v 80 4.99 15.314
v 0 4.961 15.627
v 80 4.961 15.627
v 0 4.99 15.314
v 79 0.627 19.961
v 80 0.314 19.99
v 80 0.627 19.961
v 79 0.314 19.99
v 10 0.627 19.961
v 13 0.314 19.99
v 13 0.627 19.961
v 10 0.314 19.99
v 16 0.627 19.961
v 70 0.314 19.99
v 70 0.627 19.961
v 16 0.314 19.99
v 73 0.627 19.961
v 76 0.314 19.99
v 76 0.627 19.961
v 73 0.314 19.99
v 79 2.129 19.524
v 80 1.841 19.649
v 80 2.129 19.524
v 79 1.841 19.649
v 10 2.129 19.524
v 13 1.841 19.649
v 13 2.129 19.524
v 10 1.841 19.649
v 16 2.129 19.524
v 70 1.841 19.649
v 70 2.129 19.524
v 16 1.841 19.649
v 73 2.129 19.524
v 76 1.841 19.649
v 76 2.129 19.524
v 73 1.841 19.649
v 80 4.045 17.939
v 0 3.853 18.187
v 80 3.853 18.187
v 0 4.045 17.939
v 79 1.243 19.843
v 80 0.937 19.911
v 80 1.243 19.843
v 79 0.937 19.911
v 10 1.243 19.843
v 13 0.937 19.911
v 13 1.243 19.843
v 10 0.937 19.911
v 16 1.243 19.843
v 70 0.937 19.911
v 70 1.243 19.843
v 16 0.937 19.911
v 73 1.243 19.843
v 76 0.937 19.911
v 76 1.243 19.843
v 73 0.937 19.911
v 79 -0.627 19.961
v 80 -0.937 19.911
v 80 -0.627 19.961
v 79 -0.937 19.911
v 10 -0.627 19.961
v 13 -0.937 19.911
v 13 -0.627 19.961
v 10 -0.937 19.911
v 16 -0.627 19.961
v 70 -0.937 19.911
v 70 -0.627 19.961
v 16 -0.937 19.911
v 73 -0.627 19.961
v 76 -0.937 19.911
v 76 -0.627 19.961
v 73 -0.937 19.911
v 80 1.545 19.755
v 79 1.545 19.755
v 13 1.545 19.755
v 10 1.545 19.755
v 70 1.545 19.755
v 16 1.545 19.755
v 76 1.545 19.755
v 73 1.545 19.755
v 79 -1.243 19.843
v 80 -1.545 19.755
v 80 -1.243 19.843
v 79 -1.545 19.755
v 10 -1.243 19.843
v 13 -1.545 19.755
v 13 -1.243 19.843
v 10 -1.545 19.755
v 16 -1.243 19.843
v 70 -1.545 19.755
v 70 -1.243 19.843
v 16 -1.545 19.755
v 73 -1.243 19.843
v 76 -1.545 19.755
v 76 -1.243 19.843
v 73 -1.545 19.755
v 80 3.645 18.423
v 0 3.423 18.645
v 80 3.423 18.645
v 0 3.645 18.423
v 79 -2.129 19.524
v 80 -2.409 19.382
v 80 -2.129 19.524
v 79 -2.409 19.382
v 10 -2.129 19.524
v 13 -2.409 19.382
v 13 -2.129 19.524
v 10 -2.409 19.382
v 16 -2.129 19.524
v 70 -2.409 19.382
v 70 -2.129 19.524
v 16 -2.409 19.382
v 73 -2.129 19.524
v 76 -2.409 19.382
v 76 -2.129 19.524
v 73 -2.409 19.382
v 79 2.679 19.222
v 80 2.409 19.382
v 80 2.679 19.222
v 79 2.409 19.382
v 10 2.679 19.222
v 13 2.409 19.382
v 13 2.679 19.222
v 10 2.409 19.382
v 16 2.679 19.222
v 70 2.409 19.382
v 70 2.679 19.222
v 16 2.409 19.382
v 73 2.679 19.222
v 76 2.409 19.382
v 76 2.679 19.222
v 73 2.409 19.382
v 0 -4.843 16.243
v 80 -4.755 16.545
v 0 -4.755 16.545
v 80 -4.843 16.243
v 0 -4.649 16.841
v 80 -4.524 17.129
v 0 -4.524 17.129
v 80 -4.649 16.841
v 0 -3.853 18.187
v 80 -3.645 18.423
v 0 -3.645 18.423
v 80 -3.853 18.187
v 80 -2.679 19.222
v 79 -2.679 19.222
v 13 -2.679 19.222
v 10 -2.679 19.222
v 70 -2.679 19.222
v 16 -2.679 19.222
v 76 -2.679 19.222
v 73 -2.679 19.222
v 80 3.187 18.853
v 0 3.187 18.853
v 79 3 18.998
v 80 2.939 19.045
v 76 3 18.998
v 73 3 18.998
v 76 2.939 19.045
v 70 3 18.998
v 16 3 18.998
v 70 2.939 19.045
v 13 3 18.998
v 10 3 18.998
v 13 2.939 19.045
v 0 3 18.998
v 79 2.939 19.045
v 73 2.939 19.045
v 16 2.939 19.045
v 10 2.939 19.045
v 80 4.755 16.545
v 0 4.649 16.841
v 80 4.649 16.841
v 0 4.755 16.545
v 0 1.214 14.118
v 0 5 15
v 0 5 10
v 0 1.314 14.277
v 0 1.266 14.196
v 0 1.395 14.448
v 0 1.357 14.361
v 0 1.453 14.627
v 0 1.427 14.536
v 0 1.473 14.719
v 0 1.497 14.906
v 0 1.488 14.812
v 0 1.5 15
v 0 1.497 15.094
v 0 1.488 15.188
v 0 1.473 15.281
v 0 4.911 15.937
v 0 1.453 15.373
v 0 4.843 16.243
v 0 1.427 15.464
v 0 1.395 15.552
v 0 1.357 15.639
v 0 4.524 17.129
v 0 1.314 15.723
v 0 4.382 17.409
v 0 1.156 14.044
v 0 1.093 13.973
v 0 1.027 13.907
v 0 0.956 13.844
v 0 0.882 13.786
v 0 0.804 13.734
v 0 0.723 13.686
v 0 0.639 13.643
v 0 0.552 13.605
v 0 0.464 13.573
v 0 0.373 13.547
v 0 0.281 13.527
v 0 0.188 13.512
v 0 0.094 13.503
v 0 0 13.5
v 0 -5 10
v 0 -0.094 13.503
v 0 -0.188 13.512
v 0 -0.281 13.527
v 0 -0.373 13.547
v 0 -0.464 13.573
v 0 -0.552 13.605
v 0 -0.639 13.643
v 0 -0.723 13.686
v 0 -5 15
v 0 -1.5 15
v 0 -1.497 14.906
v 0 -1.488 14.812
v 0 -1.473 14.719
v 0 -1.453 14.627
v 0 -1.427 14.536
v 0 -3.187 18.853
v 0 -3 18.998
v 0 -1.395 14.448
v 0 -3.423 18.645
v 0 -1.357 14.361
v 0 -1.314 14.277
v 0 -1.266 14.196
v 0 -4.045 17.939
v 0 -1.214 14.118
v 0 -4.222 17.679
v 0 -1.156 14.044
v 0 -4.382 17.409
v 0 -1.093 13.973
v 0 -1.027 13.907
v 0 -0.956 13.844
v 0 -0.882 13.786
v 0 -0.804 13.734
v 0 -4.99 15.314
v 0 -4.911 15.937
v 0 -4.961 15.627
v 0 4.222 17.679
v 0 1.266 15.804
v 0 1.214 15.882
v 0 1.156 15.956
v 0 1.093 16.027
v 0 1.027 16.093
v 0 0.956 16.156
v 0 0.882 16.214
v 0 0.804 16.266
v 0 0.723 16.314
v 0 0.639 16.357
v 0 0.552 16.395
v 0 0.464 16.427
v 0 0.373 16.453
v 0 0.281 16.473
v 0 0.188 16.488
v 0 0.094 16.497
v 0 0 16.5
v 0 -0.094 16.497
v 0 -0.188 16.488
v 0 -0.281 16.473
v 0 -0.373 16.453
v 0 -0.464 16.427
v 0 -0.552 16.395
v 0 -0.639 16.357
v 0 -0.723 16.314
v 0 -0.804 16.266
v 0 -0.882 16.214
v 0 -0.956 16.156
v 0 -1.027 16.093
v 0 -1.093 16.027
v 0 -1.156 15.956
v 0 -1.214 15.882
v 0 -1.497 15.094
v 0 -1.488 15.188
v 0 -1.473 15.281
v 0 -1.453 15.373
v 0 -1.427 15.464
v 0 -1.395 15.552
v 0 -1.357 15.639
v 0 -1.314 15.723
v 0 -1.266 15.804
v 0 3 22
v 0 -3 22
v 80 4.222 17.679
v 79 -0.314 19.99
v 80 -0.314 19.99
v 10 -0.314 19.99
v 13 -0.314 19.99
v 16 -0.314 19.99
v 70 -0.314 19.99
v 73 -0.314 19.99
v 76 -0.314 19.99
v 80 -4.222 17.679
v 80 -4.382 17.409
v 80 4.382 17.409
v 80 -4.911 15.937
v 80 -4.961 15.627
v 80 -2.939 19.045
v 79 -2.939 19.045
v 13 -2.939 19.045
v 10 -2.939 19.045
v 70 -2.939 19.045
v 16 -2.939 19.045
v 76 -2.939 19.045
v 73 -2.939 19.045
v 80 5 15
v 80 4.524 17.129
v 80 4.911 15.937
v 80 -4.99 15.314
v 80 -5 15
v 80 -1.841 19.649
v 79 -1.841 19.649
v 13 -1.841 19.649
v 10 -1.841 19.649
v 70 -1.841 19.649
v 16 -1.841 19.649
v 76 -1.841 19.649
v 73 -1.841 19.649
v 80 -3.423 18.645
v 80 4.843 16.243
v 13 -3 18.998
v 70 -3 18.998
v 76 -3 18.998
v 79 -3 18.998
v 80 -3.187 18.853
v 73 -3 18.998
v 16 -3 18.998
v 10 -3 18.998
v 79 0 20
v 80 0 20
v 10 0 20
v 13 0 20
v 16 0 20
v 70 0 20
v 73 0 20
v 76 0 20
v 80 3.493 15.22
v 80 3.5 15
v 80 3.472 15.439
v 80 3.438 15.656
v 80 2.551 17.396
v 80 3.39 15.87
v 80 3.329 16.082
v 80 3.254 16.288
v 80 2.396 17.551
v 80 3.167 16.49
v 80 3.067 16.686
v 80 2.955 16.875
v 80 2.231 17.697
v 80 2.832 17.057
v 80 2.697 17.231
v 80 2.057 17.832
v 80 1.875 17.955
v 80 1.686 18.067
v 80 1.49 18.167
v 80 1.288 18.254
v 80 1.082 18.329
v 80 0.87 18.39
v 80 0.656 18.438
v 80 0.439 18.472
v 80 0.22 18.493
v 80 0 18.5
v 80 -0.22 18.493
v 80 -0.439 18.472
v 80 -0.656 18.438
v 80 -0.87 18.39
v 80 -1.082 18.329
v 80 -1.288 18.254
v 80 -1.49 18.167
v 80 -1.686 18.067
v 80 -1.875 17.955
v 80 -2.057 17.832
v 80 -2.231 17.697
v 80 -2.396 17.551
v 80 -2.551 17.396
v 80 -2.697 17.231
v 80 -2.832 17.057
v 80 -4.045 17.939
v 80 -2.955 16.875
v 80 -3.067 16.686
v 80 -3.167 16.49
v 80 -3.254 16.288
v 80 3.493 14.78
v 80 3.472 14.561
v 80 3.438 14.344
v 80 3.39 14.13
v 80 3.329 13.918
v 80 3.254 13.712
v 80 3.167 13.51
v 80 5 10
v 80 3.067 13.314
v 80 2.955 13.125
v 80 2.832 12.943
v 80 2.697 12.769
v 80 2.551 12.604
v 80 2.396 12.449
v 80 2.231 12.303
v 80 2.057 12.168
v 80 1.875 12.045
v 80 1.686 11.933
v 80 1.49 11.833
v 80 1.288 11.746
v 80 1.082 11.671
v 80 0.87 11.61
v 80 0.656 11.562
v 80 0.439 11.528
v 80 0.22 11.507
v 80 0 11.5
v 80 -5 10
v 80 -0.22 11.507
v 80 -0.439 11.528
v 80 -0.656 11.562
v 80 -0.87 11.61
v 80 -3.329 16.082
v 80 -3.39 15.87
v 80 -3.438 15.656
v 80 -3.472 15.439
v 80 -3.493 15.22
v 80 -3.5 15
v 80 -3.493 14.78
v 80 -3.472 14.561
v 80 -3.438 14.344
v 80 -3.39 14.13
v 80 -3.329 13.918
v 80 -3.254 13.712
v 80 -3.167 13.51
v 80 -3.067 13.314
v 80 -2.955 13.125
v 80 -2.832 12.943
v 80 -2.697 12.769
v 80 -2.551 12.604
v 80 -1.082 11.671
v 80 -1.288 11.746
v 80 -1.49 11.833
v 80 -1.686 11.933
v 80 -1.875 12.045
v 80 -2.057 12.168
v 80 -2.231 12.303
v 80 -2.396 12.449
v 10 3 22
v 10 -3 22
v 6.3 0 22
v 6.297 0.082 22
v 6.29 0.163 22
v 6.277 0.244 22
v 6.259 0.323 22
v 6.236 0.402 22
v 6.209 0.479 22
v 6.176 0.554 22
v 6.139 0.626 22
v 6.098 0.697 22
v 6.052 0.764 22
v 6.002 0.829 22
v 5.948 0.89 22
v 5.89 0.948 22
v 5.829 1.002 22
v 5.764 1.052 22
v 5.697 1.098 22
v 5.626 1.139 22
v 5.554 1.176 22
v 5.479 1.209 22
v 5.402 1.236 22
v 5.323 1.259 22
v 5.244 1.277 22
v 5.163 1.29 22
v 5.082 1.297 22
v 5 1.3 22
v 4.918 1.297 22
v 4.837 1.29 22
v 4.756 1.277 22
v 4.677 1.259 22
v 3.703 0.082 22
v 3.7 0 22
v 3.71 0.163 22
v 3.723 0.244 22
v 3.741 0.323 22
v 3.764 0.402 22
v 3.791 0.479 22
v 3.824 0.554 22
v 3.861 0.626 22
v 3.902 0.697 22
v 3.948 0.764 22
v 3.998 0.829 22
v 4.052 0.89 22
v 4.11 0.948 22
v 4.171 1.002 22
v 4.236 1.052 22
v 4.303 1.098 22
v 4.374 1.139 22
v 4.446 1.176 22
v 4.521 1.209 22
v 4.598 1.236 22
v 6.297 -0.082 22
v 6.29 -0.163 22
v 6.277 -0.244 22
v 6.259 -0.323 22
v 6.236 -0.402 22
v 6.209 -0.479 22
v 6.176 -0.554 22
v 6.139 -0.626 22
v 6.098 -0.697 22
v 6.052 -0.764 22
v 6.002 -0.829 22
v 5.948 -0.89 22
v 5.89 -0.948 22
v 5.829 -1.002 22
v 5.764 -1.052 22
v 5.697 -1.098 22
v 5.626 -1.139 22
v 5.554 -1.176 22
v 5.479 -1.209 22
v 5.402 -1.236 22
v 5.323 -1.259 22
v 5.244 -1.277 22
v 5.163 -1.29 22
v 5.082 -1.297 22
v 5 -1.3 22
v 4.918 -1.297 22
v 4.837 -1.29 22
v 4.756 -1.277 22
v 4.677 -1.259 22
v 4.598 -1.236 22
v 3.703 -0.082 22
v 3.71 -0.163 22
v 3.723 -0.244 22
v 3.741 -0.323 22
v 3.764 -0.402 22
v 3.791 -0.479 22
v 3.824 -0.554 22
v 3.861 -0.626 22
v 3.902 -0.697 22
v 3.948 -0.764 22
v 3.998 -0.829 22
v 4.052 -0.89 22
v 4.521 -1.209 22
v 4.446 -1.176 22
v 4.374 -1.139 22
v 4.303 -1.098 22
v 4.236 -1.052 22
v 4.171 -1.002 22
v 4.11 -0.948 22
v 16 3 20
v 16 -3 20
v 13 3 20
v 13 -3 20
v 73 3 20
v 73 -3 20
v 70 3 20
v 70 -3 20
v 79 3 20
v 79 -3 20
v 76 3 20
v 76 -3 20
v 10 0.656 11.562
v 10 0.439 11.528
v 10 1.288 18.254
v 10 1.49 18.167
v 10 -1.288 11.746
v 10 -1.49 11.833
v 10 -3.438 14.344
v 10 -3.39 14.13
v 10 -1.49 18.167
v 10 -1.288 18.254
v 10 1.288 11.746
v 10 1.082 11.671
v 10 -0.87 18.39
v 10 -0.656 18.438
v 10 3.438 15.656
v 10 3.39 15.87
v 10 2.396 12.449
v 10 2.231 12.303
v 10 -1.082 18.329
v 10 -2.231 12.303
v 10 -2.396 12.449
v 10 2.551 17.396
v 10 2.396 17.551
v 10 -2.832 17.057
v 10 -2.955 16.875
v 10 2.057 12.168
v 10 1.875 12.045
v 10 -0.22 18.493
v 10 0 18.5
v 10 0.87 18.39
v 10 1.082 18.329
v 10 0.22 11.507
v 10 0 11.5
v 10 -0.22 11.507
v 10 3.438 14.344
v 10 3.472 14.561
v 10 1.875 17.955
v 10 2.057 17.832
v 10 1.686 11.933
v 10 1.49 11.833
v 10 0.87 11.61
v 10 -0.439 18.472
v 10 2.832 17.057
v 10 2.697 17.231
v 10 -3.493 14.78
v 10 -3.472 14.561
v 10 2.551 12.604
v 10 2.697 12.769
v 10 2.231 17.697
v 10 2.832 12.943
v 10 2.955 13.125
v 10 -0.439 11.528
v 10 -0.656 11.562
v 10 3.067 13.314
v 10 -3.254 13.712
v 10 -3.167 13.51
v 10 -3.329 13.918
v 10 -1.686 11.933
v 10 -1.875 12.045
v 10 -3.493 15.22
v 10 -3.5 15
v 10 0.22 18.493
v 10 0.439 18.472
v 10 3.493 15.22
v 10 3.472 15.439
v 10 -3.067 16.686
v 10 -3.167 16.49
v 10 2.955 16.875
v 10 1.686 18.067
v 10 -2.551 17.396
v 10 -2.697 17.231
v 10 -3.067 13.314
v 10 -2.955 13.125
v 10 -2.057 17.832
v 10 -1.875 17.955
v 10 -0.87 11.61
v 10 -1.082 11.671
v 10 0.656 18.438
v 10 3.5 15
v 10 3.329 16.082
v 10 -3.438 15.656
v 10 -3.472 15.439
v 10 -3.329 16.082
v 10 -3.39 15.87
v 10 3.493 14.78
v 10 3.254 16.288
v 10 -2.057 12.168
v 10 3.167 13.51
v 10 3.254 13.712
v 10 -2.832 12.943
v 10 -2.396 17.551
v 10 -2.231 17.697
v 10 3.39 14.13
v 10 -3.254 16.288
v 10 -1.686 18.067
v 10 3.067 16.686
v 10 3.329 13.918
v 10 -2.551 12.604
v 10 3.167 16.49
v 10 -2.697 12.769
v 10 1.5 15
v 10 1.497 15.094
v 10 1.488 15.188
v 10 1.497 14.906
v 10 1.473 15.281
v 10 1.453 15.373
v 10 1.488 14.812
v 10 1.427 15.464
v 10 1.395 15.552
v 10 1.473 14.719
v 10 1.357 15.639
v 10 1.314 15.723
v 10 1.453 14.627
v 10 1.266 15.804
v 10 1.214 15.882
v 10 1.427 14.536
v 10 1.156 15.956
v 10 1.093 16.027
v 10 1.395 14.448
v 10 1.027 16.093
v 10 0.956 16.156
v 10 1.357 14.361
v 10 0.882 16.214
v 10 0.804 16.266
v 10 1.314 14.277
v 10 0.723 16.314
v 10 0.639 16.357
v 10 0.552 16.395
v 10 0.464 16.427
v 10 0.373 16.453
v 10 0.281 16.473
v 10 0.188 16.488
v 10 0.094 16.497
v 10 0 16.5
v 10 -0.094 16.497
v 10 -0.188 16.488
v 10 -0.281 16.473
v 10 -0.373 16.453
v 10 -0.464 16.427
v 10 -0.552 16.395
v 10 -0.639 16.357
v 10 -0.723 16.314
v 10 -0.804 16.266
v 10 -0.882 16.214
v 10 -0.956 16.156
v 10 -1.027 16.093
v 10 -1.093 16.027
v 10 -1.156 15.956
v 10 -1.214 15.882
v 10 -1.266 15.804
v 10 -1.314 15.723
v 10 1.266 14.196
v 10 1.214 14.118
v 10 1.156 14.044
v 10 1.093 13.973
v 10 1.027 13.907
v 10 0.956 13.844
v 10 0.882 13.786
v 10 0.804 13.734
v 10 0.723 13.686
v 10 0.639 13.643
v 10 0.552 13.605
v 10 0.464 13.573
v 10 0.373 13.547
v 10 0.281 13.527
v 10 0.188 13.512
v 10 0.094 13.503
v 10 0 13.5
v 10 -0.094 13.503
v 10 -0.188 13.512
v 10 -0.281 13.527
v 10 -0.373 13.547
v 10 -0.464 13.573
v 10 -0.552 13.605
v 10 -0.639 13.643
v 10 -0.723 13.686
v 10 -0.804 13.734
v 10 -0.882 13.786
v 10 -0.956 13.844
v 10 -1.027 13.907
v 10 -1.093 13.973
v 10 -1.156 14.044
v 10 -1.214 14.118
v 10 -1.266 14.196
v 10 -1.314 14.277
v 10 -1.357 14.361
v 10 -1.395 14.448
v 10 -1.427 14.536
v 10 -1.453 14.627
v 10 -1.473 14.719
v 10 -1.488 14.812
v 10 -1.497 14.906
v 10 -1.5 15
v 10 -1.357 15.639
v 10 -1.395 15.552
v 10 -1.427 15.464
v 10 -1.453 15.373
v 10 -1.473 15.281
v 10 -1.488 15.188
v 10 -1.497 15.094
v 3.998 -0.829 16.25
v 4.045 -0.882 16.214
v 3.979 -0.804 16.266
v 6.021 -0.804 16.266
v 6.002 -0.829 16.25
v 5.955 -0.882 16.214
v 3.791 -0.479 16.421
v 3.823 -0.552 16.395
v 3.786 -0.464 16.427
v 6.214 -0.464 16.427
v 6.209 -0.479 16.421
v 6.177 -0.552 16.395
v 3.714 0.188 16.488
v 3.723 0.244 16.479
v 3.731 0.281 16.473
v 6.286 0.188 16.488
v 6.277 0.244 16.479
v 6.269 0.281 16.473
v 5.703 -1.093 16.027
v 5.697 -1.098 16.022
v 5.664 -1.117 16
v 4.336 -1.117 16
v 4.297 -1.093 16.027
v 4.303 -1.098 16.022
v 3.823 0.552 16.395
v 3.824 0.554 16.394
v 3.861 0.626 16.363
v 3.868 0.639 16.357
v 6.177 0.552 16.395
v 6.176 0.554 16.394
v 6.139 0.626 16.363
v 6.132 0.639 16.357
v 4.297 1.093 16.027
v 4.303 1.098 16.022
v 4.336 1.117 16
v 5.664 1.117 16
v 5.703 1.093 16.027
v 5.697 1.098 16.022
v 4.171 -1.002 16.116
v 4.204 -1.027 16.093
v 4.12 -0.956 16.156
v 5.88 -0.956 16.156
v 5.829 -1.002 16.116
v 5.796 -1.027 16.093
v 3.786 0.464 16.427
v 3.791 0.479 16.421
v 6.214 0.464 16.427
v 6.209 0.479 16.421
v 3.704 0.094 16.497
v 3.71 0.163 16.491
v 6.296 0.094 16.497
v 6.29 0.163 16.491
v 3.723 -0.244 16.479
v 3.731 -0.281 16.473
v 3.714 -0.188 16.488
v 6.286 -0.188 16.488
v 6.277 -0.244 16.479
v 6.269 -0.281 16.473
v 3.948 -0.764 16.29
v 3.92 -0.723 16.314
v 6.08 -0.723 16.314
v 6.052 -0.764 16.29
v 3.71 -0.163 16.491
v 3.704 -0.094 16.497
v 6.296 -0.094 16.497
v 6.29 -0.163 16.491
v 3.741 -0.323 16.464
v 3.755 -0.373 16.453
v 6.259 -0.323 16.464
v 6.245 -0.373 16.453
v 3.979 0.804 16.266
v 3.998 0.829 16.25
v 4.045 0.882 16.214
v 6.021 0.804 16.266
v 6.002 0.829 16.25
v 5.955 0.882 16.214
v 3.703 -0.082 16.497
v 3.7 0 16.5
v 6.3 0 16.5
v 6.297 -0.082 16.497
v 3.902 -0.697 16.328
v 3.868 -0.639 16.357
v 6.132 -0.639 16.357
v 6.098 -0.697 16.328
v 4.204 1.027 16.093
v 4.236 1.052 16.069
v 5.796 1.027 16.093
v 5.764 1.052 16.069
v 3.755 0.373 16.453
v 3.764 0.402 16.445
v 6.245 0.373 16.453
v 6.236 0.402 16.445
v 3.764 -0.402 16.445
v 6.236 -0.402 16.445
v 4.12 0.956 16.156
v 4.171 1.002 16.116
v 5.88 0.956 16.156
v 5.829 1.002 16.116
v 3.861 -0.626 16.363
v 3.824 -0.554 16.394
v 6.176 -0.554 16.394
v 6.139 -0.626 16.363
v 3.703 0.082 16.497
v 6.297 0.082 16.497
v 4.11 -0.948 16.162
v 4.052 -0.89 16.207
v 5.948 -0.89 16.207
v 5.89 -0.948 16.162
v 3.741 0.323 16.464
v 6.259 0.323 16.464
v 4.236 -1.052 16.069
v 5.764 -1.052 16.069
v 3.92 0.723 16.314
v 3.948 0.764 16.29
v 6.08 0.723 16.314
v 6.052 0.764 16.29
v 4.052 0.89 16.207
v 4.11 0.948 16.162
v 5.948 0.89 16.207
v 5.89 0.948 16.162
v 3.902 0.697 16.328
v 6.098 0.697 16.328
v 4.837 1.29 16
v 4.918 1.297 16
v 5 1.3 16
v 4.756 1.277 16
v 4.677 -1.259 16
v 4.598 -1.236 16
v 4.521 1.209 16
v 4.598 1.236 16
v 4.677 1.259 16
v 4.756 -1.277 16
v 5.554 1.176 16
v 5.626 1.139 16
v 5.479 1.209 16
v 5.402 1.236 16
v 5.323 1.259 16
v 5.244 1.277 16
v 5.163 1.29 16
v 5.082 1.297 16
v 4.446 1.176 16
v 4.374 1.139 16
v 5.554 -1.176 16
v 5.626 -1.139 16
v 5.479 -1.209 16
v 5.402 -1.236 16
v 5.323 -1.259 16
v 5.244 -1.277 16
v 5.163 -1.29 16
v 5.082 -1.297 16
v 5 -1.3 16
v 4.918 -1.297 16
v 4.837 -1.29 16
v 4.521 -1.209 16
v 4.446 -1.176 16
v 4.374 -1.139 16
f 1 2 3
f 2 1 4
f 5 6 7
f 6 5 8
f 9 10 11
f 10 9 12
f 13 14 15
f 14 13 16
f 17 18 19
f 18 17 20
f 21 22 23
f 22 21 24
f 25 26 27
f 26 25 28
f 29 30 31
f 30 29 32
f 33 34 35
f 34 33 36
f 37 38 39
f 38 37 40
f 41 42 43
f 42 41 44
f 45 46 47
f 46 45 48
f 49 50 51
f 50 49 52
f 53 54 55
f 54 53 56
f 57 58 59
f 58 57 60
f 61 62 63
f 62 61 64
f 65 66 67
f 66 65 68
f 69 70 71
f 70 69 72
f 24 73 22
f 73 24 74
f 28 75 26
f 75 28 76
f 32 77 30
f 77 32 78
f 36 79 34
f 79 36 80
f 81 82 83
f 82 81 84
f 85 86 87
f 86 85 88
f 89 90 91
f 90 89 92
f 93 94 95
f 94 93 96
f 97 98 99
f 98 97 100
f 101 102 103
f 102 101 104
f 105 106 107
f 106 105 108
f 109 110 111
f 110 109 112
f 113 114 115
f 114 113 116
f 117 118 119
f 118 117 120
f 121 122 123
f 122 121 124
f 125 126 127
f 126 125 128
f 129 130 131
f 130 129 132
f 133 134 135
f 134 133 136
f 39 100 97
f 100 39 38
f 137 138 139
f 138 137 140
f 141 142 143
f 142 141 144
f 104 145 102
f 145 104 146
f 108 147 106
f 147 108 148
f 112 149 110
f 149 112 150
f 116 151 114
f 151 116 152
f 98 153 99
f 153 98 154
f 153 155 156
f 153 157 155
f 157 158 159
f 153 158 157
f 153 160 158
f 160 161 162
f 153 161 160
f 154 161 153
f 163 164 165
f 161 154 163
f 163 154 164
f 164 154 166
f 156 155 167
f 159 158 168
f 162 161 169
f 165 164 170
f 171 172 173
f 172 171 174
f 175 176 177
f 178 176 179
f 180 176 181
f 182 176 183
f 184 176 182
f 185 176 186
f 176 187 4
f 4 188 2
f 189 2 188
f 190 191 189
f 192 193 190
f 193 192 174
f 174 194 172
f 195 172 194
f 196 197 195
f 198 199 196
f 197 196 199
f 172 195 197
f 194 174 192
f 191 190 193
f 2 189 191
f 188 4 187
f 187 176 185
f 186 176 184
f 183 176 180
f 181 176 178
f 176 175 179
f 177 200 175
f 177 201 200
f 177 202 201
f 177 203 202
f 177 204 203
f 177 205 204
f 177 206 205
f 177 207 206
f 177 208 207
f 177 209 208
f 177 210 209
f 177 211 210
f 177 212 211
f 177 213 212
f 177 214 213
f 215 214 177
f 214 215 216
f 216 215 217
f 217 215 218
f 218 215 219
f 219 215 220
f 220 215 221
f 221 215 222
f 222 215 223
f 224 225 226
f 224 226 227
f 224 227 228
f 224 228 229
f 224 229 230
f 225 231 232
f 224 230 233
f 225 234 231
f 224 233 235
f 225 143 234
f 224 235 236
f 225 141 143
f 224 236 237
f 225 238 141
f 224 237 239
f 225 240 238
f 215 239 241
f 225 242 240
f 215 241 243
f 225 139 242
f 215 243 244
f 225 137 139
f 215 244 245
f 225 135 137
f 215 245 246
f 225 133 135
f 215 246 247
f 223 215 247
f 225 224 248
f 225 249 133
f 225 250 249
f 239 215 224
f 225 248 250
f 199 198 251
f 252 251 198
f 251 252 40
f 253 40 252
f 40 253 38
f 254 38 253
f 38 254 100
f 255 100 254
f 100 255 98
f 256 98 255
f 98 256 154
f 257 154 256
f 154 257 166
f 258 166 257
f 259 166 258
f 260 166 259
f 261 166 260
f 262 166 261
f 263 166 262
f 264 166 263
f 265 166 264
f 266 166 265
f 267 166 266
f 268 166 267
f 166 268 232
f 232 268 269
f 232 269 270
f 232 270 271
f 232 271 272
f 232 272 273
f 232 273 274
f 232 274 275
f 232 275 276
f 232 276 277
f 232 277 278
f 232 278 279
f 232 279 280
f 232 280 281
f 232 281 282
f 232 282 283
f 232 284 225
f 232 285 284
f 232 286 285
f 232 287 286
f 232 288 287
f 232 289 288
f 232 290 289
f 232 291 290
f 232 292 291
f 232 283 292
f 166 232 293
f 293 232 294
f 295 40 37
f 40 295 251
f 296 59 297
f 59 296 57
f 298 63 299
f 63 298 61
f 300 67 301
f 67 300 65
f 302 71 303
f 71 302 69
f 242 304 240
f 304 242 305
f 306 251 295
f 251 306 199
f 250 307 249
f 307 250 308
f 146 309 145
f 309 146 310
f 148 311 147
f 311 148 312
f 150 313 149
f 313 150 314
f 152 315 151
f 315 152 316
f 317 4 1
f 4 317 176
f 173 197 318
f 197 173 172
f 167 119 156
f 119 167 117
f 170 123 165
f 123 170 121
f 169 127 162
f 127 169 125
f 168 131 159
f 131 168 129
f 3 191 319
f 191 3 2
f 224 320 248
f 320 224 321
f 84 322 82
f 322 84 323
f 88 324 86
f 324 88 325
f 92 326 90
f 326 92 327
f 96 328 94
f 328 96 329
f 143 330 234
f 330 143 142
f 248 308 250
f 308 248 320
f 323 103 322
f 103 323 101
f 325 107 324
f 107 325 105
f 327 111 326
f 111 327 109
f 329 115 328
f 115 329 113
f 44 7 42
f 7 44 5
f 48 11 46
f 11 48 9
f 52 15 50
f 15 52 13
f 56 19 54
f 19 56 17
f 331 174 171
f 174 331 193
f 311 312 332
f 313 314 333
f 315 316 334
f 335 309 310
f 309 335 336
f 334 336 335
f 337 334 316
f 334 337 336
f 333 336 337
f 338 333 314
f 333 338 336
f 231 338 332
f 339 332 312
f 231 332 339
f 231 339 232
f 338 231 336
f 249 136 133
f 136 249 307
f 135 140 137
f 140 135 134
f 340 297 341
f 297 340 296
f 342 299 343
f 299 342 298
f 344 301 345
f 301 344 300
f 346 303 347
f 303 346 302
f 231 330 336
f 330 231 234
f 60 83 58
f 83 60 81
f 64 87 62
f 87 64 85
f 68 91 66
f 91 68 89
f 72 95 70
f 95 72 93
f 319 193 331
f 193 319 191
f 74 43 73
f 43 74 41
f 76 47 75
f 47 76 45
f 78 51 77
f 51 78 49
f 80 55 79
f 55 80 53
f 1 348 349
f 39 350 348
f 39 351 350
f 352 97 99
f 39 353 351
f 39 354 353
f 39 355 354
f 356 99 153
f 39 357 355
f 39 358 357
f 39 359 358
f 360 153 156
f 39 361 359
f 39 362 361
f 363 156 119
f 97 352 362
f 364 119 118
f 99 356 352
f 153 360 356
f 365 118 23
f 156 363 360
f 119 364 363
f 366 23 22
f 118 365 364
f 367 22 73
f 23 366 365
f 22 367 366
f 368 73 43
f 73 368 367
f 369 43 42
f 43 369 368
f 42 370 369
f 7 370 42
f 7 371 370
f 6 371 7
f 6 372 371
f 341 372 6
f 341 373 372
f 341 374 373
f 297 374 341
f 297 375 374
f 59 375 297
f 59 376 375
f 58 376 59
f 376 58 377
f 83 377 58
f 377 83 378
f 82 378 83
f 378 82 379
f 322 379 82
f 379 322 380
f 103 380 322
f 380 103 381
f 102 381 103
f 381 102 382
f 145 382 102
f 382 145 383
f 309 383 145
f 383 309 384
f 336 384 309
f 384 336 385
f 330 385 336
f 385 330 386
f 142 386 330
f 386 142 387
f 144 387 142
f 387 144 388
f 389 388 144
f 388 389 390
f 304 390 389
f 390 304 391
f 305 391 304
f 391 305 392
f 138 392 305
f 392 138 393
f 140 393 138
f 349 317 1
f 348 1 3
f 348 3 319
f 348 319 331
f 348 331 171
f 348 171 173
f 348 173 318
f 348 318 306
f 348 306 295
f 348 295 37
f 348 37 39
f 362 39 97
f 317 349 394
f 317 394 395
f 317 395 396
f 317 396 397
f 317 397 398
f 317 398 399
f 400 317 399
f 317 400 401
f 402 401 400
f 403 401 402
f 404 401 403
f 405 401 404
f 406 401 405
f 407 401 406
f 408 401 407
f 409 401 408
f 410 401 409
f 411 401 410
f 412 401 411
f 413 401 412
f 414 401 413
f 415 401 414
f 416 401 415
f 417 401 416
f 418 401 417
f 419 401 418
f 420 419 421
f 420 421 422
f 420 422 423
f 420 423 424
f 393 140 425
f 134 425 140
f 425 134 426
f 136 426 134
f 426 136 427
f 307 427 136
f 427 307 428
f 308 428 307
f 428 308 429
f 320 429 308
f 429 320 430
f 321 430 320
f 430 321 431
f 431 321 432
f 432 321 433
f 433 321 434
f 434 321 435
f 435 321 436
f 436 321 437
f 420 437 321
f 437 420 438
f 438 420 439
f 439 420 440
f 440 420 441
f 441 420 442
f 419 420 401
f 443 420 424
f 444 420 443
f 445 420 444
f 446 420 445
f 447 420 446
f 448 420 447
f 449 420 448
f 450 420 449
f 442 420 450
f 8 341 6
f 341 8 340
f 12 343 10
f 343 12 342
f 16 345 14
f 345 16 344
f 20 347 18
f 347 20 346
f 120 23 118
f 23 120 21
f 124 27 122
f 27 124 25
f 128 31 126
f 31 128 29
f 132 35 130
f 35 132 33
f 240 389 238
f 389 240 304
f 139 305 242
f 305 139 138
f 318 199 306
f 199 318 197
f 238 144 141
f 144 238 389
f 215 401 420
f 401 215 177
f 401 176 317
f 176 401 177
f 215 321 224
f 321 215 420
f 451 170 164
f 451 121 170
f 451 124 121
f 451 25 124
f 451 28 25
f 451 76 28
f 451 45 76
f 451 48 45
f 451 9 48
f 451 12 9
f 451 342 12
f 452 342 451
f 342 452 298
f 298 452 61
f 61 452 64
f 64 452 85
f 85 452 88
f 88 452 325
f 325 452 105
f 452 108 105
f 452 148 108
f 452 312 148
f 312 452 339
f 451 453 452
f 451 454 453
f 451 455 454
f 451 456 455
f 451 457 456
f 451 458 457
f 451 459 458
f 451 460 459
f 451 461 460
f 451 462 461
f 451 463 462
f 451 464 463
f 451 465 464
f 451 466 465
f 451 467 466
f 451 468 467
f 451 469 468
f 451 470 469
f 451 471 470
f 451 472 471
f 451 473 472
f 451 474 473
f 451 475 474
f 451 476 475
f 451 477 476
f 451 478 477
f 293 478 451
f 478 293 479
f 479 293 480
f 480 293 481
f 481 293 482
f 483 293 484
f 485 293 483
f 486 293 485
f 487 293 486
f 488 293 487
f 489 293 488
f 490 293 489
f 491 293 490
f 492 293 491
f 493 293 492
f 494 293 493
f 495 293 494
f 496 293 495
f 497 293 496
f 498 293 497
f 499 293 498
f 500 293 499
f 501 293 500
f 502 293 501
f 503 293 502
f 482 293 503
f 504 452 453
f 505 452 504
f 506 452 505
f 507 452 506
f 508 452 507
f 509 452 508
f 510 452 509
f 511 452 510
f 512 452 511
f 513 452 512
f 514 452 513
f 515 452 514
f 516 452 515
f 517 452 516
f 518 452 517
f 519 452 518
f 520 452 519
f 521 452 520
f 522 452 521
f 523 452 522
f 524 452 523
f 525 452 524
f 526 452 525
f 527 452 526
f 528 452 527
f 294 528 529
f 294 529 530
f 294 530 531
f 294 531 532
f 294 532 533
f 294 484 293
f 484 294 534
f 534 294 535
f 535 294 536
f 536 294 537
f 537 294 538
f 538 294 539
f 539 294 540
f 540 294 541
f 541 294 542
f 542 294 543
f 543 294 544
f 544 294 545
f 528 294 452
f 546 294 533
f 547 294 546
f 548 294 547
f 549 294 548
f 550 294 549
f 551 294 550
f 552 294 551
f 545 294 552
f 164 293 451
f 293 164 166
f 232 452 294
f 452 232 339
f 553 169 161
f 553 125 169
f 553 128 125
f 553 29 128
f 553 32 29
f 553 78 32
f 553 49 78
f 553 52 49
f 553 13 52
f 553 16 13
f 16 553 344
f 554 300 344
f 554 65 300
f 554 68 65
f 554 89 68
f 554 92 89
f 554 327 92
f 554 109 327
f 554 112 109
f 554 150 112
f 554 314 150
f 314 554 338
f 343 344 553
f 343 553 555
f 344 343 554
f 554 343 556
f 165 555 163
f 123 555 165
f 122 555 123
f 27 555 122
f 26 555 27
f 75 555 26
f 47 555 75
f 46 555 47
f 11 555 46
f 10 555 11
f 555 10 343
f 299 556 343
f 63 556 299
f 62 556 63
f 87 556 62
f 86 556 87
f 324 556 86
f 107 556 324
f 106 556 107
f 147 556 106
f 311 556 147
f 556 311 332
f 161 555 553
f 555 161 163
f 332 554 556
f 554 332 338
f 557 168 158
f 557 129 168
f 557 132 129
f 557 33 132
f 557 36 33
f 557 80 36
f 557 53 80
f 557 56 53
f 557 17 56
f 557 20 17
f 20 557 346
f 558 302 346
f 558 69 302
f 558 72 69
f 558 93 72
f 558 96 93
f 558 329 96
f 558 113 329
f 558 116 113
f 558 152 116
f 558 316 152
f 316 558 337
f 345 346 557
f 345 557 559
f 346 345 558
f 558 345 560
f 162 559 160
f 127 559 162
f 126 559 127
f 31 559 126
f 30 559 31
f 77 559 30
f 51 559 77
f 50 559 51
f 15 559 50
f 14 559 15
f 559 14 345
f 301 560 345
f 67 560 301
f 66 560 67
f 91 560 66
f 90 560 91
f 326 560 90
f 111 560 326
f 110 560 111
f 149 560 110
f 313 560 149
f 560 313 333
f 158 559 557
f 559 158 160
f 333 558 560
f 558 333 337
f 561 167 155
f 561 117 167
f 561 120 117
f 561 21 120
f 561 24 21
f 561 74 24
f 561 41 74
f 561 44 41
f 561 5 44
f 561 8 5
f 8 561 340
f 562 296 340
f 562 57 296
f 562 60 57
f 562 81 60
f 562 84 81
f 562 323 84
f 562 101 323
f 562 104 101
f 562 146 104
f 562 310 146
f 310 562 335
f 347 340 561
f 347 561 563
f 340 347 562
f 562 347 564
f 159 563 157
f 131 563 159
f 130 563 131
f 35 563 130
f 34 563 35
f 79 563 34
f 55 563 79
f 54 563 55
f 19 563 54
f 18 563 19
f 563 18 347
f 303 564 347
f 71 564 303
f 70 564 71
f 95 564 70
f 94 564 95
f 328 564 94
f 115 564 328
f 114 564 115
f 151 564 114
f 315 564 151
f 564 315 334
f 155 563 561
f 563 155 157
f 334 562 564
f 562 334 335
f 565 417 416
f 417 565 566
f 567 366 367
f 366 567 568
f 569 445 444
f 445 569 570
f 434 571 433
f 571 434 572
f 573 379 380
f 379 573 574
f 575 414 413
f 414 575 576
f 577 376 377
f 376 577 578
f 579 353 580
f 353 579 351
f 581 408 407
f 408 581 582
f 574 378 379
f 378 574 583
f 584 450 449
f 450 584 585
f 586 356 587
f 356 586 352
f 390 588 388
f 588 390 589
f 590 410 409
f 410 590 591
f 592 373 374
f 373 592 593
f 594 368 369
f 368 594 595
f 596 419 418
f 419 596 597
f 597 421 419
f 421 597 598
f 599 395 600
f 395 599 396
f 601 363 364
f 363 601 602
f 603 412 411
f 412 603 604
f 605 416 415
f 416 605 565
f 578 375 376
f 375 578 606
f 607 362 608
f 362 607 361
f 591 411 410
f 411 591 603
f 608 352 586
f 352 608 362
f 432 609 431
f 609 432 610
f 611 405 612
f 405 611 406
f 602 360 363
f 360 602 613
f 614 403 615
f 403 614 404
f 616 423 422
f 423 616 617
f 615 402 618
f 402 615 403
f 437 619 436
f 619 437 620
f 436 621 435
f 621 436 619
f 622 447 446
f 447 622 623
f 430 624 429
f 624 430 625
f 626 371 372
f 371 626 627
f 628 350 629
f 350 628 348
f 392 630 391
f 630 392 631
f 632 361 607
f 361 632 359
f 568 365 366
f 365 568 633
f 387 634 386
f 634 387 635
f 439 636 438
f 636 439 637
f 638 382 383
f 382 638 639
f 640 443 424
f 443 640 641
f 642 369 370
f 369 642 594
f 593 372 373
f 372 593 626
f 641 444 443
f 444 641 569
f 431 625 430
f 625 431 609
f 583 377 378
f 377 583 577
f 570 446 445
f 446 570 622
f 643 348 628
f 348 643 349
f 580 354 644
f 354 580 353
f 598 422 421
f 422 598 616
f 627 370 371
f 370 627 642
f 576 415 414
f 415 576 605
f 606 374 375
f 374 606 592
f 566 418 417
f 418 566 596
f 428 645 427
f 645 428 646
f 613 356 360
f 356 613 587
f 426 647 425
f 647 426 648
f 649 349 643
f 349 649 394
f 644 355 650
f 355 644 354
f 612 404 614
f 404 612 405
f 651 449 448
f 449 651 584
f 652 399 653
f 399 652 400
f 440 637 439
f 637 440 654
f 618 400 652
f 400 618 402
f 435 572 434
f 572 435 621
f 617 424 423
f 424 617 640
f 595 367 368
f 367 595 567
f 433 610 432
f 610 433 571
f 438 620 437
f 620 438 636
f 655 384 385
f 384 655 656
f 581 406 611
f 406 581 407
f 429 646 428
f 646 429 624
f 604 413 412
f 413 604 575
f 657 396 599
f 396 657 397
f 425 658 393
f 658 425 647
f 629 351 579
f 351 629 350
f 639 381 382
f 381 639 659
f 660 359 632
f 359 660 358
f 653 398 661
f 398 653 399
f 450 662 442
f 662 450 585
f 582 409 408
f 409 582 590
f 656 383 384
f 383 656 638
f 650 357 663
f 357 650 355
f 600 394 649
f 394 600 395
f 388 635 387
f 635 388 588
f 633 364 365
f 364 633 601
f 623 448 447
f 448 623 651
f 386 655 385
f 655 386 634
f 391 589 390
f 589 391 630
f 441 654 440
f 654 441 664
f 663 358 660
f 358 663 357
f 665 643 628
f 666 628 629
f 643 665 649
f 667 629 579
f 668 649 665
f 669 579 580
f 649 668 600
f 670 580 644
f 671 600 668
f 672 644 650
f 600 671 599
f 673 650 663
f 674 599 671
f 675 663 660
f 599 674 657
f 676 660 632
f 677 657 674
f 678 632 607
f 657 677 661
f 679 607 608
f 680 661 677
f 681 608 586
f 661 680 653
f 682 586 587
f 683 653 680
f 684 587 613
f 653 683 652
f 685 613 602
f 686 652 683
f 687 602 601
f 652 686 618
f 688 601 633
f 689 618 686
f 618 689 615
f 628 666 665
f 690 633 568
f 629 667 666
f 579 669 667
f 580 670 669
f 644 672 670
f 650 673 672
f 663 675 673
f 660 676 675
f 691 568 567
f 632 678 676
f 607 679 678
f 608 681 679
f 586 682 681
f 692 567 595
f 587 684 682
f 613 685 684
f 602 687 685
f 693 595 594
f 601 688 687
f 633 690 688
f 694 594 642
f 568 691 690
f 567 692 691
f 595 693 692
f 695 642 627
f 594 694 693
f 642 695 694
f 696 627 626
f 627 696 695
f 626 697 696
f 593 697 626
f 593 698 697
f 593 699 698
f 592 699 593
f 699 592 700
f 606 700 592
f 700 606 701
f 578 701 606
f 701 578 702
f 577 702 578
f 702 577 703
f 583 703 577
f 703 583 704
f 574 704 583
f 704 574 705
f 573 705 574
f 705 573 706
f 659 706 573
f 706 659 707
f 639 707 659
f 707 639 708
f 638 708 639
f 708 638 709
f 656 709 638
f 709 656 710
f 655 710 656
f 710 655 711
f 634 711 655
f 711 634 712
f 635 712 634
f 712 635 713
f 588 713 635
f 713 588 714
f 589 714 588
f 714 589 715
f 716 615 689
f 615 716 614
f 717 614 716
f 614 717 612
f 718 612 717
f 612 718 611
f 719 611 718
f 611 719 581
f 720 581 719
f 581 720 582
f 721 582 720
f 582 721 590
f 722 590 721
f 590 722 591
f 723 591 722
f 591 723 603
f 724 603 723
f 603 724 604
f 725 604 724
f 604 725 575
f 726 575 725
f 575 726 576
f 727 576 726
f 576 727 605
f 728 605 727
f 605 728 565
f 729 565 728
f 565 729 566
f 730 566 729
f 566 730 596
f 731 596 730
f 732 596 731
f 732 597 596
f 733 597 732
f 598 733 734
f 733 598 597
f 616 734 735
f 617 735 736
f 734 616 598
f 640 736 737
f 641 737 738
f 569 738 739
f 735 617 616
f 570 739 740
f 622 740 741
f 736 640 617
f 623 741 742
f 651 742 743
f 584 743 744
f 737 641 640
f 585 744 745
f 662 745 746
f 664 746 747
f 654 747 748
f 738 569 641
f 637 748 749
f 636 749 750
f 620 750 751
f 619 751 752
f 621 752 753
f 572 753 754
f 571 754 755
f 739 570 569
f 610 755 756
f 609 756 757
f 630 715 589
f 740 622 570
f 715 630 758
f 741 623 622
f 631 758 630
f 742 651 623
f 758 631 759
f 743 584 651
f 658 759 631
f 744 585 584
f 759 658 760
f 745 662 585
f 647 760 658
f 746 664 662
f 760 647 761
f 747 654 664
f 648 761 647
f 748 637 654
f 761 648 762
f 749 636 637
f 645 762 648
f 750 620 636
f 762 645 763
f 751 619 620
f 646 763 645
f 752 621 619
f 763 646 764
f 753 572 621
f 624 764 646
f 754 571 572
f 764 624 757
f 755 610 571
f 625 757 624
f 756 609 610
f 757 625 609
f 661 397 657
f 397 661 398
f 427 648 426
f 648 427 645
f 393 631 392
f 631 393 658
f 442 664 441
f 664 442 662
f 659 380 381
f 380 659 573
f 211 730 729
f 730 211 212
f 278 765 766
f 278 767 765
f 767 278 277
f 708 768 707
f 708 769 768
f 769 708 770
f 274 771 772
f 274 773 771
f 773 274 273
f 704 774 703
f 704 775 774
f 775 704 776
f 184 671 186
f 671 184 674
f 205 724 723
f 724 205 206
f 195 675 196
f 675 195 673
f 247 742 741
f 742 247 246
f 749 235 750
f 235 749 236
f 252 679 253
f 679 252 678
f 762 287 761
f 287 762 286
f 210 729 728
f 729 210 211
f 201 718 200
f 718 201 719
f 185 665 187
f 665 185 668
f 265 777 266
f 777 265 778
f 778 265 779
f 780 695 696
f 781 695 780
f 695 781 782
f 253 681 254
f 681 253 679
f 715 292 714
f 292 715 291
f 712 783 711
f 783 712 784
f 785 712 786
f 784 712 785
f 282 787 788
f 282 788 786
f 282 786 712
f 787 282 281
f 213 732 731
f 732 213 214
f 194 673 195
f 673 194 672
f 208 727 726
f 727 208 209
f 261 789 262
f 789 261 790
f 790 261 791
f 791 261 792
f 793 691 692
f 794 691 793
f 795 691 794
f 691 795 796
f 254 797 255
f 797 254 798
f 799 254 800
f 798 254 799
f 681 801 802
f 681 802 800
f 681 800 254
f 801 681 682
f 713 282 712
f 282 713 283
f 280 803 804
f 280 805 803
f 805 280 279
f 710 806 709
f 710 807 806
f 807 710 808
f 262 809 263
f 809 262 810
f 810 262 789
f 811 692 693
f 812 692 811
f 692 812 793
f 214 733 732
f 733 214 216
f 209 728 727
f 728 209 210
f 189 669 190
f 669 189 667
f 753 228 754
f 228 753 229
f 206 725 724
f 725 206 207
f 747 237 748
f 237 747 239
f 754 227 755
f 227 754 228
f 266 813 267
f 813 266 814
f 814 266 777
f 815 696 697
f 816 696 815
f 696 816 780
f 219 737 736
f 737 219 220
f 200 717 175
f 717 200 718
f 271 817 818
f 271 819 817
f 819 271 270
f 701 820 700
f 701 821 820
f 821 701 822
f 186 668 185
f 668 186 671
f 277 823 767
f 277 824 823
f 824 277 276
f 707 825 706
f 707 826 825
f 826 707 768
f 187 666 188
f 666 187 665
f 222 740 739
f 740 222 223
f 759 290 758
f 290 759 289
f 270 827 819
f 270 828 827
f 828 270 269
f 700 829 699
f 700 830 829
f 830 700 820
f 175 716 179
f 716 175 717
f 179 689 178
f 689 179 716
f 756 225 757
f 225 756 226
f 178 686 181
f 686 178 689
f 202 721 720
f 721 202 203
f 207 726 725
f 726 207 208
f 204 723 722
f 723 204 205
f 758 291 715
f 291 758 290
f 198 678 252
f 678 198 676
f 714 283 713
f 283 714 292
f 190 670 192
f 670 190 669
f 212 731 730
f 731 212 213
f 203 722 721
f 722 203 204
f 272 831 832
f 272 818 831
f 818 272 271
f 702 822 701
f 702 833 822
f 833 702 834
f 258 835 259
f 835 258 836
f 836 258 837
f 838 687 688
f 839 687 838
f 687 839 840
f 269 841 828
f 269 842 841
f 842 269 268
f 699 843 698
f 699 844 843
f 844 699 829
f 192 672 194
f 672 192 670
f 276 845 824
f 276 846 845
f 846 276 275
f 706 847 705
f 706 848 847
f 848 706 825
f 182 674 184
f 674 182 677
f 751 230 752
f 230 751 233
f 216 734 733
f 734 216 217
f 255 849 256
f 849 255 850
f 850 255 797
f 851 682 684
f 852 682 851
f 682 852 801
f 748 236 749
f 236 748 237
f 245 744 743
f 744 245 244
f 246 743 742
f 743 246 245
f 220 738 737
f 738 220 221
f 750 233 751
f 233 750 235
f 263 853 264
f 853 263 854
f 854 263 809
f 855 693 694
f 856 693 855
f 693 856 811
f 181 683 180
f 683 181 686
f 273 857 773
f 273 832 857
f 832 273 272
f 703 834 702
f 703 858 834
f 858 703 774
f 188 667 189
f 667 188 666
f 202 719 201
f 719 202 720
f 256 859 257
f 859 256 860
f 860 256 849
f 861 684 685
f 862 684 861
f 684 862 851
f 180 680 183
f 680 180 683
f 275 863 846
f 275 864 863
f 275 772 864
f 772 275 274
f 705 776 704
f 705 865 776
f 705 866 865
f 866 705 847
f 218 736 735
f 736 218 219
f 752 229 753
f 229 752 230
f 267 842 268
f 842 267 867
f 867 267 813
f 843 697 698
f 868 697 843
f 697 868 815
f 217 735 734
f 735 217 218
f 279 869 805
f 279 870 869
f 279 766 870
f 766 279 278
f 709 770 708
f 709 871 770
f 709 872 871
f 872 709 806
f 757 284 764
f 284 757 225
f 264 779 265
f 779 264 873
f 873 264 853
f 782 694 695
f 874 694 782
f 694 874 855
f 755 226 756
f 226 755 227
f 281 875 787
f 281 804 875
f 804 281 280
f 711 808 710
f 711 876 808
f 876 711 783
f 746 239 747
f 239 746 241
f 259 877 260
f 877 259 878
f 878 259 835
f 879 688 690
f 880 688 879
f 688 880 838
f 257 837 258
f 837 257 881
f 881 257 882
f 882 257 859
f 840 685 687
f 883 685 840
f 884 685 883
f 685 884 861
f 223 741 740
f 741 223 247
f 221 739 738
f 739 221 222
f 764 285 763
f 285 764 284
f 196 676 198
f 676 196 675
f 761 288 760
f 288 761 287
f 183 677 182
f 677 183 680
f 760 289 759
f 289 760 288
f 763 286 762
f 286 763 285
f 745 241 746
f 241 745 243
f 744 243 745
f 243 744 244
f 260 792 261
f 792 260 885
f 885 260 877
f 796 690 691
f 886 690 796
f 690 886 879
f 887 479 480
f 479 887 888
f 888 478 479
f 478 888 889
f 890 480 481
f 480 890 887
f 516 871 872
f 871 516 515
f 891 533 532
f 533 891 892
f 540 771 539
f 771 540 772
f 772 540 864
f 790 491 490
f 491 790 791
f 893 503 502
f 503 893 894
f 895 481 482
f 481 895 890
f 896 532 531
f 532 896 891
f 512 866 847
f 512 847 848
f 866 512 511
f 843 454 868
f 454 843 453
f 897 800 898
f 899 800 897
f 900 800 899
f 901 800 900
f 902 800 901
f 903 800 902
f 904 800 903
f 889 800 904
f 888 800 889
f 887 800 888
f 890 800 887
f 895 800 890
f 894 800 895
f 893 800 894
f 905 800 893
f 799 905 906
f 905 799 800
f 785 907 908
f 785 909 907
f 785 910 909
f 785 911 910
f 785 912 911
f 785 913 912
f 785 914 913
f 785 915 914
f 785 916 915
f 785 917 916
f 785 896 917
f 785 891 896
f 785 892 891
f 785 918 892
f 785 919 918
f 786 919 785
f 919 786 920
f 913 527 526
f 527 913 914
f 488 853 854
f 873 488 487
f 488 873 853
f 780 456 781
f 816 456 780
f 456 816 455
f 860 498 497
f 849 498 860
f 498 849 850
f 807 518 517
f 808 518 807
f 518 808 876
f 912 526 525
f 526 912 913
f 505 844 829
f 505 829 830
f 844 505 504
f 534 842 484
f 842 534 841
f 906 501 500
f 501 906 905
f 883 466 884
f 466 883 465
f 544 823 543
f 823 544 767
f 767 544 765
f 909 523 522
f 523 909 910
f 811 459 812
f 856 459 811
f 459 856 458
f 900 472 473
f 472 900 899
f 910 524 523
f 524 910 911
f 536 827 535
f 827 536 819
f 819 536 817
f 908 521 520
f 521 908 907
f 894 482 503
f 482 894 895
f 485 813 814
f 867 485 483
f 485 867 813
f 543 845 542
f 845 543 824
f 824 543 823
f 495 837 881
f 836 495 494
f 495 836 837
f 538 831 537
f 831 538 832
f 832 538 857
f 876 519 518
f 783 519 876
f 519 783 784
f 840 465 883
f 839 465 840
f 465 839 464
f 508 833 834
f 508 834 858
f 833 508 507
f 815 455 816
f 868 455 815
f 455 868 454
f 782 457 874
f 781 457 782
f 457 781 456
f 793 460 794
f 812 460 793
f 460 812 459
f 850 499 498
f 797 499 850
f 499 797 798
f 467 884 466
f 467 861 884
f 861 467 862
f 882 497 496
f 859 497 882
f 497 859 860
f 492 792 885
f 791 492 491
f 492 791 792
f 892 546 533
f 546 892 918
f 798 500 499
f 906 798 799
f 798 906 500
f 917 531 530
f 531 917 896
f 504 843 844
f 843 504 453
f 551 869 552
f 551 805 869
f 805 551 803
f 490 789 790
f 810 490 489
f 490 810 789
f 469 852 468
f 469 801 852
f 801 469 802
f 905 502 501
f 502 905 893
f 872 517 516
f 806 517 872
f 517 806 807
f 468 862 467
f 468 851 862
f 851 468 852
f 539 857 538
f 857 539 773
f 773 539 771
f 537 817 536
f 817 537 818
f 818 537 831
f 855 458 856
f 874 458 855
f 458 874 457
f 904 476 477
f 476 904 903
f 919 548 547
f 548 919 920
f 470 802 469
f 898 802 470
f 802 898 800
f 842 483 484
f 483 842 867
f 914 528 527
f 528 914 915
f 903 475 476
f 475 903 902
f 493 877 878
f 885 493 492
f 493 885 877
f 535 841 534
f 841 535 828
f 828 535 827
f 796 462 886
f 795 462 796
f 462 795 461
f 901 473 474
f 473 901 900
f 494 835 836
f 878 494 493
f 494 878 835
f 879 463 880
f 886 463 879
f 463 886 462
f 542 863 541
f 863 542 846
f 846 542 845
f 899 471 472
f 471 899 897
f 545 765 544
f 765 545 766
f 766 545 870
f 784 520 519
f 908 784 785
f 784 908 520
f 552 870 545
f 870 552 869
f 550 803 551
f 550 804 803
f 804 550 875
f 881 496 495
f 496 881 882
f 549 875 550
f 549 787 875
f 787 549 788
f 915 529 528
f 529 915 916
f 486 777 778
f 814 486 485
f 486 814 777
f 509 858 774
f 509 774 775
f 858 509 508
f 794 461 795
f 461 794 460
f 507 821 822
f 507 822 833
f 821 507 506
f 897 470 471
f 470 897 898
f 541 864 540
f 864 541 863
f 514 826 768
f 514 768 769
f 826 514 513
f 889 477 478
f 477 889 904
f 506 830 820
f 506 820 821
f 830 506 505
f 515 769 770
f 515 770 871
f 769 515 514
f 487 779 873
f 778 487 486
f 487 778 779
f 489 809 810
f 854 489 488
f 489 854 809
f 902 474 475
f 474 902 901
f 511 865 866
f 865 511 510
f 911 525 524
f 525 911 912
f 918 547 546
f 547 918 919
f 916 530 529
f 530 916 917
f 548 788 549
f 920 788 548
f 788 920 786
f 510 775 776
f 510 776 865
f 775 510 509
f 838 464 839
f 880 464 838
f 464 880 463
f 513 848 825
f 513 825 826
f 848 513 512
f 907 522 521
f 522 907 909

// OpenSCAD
difference(){
	union(){ 
        
        translate([0,0,15]){
            rotate(a = [0,90,0]) {
                cylinder(h=80, r=5, $fn=100, center=false);
            }
        }	
        translate([0,-5,10]){
           cube([80,10,5], center=false);
        }
        translate([0,-3,10]){
           cube([10,6,12], center=false);
        }
        translate([13,-3,10]){
           cube([3,6,10], center=false);
        }
        translate([70,-3,10]){
           cube([3,6,10], center=false);
        }
        translate([76,-3,10]){
           cube([3,6,10], center=false);
        }
    
	}
	union() {


        translate([10,0,15]){
            rotate(a = [0,90,0]) {
                cylinder(h=320, r=3.5, $fn=100, center=false);
            }
        }	
        translate([-10,0,15]){
            rotate(a = [0,90,0]) {
                cylinder(h=320, r=1.5, $fn=100, center=false);
            }
        }	
        
        
        translate([5,00,16]){
            rotate(a = [0,0,90]) {
                cylinder(h=300, r=1.3, $fn=100, center=false);
            }
        }	
        translate([5,10,5]){
            rotate(a = [90,0,0]) {
                cylinder(h=300, r=1.4, $fn=100, center=false);
            }
        }


	}
}
